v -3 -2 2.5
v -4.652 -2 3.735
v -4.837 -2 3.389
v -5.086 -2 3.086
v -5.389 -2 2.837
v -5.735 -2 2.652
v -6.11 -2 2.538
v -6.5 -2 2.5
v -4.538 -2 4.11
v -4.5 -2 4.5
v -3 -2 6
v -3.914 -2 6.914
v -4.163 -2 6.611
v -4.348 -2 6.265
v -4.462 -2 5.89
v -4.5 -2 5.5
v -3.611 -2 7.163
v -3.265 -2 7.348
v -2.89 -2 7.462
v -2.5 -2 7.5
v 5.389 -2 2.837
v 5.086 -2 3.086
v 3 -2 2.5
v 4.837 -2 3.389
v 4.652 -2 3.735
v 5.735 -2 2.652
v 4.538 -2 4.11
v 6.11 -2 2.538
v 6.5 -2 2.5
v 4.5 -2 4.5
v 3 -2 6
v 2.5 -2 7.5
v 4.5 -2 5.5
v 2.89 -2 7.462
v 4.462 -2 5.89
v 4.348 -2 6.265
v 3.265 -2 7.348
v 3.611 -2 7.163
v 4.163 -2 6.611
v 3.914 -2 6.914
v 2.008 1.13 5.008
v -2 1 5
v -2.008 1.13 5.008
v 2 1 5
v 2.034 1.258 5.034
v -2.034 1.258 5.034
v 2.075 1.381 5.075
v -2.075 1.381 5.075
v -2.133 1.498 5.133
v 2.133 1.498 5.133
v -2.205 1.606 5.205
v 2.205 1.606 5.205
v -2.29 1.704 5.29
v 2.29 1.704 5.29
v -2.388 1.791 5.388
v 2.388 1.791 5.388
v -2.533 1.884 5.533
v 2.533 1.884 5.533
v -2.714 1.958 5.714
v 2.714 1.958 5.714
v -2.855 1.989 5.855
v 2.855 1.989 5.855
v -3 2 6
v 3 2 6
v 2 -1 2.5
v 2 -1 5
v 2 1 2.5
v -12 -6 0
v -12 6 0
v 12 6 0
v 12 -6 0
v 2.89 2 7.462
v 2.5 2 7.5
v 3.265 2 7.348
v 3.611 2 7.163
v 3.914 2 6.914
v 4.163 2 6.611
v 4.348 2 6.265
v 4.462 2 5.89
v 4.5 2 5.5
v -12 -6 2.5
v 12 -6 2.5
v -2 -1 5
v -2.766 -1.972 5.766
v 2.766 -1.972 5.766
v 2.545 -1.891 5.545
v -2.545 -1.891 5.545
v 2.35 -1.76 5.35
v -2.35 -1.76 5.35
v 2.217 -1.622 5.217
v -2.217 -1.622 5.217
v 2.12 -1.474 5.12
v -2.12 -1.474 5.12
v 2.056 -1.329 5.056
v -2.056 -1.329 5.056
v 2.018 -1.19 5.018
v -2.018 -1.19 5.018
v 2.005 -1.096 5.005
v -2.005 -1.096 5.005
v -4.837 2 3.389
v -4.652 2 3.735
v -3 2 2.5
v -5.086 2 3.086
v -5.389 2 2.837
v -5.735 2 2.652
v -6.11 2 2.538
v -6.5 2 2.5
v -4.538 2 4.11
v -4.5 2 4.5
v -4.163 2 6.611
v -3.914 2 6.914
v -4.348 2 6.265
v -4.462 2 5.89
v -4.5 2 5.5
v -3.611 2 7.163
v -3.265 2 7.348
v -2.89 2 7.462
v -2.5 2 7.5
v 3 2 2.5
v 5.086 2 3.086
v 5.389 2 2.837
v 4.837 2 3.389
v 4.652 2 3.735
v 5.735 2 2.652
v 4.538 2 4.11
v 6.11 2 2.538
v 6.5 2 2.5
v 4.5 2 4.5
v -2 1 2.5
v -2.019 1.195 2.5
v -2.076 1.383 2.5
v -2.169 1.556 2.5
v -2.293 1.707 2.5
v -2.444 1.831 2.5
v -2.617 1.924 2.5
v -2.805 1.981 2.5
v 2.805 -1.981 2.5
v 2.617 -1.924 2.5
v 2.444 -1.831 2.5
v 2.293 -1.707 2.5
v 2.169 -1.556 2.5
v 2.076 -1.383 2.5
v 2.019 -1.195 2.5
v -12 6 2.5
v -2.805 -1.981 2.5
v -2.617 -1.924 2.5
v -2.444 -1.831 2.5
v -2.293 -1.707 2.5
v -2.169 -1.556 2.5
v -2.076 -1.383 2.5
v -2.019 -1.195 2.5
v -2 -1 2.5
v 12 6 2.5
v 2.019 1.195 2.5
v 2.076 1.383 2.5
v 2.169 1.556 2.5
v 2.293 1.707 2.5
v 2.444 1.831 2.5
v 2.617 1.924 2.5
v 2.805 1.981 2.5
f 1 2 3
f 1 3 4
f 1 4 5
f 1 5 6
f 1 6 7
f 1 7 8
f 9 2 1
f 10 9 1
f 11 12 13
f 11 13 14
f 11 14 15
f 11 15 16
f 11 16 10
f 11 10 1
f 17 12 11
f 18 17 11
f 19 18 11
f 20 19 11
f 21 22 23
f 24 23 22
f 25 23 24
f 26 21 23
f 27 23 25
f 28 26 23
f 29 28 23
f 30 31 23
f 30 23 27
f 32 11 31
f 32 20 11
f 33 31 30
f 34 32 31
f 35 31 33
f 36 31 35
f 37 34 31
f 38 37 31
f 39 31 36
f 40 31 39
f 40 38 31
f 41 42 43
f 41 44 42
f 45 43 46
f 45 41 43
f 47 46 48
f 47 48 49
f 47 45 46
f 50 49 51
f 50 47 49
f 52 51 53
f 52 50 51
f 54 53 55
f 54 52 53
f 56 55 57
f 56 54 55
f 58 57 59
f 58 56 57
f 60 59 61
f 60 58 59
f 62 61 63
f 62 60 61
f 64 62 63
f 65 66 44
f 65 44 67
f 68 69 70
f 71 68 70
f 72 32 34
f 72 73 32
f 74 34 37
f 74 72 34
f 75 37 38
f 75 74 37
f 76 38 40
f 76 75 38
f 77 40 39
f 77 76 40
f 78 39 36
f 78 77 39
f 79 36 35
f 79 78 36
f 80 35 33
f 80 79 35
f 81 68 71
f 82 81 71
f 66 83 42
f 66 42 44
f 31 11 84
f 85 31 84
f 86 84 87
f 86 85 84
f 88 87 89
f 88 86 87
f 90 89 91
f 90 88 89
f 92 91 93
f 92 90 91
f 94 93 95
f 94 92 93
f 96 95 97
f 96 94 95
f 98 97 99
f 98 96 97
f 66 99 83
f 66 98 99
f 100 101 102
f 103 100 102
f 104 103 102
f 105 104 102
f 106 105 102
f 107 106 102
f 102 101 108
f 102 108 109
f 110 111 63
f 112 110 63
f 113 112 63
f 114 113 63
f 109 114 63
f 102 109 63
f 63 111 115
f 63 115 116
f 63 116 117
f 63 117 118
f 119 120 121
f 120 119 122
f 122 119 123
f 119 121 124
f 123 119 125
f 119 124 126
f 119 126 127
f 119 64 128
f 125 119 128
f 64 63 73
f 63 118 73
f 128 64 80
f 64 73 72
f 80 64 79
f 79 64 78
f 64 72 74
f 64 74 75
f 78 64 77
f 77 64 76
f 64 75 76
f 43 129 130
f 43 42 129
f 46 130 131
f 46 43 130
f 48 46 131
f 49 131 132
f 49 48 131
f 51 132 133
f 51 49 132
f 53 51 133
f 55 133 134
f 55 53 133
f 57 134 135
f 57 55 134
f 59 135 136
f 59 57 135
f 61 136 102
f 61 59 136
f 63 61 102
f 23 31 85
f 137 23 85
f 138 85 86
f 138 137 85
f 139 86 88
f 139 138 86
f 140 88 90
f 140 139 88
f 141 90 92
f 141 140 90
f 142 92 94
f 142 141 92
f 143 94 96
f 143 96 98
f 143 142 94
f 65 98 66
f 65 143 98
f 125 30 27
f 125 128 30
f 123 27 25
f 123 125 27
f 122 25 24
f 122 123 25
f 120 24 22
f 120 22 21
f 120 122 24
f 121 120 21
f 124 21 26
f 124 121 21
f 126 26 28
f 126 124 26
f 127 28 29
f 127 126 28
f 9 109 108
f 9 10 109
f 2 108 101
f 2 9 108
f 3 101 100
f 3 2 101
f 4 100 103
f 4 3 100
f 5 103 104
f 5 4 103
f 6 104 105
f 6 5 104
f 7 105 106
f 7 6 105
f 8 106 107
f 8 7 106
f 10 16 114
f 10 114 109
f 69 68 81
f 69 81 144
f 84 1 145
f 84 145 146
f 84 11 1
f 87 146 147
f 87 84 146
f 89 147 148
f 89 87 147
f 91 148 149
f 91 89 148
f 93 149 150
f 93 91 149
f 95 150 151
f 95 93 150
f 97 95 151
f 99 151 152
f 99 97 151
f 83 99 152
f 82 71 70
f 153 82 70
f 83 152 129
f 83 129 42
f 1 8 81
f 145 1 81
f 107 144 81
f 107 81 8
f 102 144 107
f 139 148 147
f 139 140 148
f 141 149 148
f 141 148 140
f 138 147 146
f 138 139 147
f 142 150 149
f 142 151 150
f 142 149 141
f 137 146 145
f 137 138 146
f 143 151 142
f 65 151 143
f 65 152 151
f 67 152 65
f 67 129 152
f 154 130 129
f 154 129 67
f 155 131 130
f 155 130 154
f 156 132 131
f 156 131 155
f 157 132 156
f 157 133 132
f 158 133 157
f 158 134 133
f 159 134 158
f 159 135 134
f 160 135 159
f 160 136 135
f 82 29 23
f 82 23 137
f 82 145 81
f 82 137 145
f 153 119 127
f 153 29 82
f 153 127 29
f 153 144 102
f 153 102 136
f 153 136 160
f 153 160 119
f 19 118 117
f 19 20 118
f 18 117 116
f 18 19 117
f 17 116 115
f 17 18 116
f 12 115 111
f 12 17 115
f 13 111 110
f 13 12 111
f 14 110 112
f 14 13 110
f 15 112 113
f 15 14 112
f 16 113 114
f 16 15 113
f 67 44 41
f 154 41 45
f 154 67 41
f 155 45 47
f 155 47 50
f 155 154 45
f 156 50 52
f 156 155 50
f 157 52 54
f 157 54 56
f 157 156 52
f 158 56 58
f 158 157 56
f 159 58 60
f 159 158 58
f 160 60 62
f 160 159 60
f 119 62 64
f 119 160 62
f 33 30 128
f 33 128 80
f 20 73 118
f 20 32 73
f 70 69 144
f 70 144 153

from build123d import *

# Parameters (mm, degrees)
F0_W     = 24
F0_H     = 12
F1_DEPTH = 2.5
F3_DEPTH = 2
F4_R     = 2
F5_R     = 1


with BuildPart() as f1:
    # F0 (on Top) → F1 (new body)
    with BuildSketch(Plane.XY):
        Rectangle(F0_W, F0_H)
    extrude(amount=F1_DEPTH)

    # F2 (on Front) → F3 (join, symmetric)
    with BuildSketch(Plane.XZ):
        Polygon((4.5, 7.5), (-4.5, 7.5), (-4.5, 2.033843), (-2, 2.033843), (-2, 5), (2, 5), (2, 2.033843), (4.5, 2.033843), align=None)
    extrude(amount=F3_DEPTH, both=True)

    # F4
    f4_edges = [f1.edges().sort_by_distance(p)[0] for p in [
        (4.5, 0, 7.5),
        (-4.5, 0, 7.5),
        (4.5, 0, 2.5),
        (-4.5, 0, 2.5),
    ]]
    fillet(f4_edges, radius=F4_R)

    # F5
    f5_edges = [f1.edges().sort_by_distance(p)[0] for p in [
        (0, -2, 5),
        (0, 2, 5),
        (2, 2, 3.75),
        (-2, 2, 3.75),
        (2, -2, 3.75),
        (-2, -2, 3.75),
    ]]
    fillet(f5_edges, radius=F5_R)


solid = f1.part
